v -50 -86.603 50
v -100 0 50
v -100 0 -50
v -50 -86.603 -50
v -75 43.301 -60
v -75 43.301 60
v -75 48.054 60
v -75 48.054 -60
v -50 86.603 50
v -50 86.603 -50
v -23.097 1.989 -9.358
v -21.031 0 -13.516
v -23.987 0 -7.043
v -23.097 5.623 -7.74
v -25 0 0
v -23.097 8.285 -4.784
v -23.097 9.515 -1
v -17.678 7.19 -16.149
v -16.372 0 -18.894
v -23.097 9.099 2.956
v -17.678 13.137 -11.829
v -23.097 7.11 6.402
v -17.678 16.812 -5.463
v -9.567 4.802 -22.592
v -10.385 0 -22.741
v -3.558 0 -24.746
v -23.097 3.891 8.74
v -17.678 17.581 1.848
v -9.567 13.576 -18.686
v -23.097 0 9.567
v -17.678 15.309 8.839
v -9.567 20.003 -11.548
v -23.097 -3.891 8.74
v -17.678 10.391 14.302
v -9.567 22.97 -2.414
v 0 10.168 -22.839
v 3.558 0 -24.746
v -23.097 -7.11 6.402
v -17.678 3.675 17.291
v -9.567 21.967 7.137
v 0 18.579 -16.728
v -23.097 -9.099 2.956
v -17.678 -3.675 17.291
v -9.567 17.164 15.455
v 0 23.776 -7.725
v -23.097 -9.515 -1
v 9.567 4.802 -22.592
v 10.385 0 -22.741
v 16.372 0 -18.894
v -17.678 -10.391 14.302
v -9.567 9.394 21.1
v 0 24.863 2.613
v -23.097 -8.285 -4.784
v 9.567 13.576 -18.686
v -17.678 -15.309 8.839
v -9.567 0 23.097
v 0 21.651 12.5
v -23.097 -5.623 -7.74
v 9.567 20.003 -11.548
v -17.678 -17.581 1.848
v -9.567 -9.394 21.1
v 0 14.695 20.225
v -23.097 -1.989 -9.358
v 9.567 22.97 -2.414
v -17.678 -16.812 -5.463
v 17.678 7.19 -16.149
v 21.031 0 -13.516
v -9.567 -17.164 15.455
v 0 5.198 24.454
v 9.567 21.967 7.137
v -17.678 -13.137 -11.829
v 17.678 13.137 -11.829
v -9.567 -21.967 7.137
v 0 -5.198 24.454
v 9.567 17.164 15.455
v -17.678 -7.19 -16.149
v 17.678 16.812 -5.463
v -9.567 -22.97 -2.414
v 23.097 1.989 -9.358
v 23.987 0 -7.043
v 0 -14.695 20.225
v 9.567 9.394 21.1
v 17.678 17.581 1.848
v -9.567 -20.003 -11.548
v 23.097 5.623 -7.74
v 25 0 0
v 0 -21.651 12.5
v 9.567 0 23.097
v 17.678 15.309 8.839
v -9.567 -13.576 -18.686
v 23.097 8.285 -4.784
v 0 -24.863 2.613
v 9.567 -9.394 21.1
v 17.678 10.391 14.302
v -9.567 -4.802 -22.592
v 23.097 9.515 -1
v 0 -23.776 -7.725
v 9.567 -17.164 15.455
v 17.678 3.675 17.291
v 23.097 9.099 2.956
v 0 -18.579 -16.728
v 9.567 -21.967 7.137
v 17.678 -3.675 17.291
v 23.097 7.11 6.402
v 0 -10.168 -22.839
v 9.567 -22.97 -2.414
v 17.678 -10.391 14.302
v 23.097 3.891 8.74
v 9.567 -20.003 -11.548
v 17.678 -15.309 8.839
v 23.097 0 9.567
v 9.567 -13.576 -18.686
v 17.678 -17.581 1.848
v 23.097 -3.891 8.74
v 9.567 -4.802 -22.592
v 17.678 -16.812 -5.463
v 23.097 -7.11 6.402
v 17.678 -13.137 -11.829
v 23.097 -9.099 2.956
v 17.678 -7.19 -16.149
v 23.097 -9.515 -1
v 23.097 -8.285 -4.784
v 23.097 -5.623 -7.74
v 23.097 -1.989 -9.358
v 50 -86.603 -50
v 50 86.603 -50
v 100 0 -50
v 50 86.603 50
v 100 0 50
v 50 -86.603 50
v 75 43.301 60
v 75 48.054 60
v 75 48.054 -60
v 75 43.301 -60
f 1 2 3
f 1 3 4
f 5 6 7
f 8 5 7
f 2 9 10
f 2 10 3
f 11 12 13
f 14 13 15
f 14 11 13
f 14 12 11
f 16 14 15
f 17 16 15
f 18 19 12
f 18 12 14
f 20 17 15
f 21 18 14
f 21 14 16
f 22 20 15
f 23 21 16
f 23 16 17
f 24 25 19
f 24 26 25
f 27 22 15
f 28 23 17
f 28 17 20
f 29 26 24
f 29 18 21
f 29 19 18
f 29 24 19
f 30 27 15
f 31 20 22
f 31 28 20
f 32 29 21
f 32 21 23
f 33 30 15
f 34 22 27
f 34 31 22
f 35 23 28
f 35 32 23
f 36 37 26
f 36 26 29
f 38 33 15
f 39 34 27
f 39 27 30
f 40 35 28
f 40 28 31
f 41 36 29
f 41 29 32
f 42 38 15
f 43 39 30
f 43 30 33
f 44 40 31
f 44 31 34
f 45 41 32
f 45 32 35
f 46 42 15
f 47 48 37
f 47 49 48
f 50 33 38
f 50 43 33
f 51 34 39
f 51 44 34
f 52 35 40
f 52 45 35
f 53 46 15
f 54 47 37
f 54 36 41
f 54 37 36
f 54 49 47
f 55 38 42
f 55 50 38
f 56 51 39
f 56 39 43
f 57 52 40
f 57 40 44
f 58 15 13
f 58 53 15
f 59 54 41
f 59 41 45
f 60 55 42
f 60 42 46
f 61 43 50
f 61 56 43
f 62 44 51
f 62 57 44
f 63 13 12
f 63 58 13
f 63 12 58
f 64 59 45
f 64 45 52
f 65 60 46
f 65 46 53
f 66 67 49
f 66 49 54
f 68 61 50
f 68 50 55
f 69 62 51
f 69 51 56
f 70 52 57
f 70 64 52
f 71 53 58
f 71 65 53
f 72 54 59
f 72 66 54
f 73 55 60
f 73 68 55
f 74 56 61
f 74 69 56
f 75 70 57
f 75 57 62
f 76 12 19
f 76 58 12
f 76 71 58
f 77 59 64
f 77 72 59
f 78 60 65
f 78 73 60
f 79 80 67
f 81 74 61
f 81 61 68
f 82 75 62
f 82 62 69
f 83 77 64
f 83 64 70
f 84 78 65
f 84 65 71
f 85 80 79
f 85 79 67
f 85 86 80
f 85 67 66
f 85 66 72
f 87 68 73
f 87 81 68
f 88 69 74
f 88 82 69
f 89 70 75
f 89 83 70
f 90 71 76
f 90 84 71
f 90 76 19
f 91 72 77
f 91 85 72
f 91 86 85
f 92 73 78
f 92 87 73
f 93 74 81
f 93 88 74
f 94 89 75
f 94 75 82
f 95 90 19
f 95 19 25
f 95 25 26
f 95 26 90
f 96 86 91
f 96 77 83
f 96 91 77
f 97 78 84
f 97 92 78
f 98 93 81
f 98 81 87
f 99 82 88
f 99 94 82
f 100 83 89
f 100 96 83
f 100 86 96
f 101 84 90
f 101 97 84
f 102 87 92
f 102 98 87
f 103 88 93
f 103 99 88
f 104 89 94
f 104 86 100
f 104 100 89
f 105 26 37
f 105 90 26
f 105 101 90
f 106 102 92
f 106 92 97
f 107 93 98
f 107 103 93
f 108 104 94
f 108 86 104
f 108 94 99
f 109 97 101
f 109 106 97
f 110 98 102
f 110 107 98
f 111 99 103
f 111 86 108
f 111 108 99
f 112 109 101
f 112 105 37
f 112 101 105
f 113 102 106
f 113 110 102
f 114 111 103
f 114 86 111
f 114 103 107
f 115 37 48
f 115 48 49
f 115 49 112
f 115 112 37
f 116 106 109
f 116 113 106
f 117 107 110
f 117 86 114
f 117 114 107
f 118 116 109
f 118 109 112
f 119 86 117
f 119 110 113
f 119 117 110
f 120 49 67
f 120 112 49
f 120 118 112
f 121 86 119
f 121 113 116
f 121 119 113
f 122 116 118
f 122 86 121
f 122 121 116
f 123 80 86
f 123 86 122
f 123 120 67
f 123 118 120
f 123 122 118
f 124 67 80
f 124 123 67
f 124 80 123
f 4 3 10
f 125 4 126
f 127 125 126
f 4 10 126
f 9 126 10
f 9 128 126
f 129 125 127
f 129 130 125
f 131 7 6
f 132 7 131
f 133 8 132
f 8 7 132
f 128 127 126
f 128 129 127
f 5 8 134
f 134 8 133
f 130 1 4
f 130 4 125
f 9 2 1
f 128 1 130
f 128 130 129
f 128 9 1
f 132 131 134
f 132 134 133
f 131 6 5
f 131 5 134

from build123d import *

# Parameters (mm, degrees)
F2_DEPTH = 50
F1_W     = 150
F1_H     = 4.752438
F3_DEPTH = 60


with BuildPart() as f2:
    # F0 (on Top) → F2 (new body, symmetric)
    with BuildSketch(Plane.XY):
        Polygon((50, 86.60254), (-50, 86.60254), (-100, 0), (-50, -86.60254), (50, -86.60254), (100, 0), align=None)
    extrude(amount=F2_DEPTH, both=True)


with BuildPart() as f3:
    # F1 (on Top) → F3 (new body, symmetric)
    with BuildSketch(Plane.XY):
        with Locations((0, 45.677489)):
            Rectangle(F1_W, F1_H)
    extrude(amount=F3_DEPTH, both=True)


with BuildPart() as f5:
    # F4 (on Front) → F5 (revolve)
    with BuildSketch(Plane.XZ):
        with BuildLine():
            Line((25, 0), (-25, 0))
            ThreePointArc((-25, 0), (0, -25), (25, 0))
        make_face()
    revolve(axis=Axis((0, 0, 0), (1, 0, 0)))


solid = Compound([f2.part, f3.part, f5.part])
